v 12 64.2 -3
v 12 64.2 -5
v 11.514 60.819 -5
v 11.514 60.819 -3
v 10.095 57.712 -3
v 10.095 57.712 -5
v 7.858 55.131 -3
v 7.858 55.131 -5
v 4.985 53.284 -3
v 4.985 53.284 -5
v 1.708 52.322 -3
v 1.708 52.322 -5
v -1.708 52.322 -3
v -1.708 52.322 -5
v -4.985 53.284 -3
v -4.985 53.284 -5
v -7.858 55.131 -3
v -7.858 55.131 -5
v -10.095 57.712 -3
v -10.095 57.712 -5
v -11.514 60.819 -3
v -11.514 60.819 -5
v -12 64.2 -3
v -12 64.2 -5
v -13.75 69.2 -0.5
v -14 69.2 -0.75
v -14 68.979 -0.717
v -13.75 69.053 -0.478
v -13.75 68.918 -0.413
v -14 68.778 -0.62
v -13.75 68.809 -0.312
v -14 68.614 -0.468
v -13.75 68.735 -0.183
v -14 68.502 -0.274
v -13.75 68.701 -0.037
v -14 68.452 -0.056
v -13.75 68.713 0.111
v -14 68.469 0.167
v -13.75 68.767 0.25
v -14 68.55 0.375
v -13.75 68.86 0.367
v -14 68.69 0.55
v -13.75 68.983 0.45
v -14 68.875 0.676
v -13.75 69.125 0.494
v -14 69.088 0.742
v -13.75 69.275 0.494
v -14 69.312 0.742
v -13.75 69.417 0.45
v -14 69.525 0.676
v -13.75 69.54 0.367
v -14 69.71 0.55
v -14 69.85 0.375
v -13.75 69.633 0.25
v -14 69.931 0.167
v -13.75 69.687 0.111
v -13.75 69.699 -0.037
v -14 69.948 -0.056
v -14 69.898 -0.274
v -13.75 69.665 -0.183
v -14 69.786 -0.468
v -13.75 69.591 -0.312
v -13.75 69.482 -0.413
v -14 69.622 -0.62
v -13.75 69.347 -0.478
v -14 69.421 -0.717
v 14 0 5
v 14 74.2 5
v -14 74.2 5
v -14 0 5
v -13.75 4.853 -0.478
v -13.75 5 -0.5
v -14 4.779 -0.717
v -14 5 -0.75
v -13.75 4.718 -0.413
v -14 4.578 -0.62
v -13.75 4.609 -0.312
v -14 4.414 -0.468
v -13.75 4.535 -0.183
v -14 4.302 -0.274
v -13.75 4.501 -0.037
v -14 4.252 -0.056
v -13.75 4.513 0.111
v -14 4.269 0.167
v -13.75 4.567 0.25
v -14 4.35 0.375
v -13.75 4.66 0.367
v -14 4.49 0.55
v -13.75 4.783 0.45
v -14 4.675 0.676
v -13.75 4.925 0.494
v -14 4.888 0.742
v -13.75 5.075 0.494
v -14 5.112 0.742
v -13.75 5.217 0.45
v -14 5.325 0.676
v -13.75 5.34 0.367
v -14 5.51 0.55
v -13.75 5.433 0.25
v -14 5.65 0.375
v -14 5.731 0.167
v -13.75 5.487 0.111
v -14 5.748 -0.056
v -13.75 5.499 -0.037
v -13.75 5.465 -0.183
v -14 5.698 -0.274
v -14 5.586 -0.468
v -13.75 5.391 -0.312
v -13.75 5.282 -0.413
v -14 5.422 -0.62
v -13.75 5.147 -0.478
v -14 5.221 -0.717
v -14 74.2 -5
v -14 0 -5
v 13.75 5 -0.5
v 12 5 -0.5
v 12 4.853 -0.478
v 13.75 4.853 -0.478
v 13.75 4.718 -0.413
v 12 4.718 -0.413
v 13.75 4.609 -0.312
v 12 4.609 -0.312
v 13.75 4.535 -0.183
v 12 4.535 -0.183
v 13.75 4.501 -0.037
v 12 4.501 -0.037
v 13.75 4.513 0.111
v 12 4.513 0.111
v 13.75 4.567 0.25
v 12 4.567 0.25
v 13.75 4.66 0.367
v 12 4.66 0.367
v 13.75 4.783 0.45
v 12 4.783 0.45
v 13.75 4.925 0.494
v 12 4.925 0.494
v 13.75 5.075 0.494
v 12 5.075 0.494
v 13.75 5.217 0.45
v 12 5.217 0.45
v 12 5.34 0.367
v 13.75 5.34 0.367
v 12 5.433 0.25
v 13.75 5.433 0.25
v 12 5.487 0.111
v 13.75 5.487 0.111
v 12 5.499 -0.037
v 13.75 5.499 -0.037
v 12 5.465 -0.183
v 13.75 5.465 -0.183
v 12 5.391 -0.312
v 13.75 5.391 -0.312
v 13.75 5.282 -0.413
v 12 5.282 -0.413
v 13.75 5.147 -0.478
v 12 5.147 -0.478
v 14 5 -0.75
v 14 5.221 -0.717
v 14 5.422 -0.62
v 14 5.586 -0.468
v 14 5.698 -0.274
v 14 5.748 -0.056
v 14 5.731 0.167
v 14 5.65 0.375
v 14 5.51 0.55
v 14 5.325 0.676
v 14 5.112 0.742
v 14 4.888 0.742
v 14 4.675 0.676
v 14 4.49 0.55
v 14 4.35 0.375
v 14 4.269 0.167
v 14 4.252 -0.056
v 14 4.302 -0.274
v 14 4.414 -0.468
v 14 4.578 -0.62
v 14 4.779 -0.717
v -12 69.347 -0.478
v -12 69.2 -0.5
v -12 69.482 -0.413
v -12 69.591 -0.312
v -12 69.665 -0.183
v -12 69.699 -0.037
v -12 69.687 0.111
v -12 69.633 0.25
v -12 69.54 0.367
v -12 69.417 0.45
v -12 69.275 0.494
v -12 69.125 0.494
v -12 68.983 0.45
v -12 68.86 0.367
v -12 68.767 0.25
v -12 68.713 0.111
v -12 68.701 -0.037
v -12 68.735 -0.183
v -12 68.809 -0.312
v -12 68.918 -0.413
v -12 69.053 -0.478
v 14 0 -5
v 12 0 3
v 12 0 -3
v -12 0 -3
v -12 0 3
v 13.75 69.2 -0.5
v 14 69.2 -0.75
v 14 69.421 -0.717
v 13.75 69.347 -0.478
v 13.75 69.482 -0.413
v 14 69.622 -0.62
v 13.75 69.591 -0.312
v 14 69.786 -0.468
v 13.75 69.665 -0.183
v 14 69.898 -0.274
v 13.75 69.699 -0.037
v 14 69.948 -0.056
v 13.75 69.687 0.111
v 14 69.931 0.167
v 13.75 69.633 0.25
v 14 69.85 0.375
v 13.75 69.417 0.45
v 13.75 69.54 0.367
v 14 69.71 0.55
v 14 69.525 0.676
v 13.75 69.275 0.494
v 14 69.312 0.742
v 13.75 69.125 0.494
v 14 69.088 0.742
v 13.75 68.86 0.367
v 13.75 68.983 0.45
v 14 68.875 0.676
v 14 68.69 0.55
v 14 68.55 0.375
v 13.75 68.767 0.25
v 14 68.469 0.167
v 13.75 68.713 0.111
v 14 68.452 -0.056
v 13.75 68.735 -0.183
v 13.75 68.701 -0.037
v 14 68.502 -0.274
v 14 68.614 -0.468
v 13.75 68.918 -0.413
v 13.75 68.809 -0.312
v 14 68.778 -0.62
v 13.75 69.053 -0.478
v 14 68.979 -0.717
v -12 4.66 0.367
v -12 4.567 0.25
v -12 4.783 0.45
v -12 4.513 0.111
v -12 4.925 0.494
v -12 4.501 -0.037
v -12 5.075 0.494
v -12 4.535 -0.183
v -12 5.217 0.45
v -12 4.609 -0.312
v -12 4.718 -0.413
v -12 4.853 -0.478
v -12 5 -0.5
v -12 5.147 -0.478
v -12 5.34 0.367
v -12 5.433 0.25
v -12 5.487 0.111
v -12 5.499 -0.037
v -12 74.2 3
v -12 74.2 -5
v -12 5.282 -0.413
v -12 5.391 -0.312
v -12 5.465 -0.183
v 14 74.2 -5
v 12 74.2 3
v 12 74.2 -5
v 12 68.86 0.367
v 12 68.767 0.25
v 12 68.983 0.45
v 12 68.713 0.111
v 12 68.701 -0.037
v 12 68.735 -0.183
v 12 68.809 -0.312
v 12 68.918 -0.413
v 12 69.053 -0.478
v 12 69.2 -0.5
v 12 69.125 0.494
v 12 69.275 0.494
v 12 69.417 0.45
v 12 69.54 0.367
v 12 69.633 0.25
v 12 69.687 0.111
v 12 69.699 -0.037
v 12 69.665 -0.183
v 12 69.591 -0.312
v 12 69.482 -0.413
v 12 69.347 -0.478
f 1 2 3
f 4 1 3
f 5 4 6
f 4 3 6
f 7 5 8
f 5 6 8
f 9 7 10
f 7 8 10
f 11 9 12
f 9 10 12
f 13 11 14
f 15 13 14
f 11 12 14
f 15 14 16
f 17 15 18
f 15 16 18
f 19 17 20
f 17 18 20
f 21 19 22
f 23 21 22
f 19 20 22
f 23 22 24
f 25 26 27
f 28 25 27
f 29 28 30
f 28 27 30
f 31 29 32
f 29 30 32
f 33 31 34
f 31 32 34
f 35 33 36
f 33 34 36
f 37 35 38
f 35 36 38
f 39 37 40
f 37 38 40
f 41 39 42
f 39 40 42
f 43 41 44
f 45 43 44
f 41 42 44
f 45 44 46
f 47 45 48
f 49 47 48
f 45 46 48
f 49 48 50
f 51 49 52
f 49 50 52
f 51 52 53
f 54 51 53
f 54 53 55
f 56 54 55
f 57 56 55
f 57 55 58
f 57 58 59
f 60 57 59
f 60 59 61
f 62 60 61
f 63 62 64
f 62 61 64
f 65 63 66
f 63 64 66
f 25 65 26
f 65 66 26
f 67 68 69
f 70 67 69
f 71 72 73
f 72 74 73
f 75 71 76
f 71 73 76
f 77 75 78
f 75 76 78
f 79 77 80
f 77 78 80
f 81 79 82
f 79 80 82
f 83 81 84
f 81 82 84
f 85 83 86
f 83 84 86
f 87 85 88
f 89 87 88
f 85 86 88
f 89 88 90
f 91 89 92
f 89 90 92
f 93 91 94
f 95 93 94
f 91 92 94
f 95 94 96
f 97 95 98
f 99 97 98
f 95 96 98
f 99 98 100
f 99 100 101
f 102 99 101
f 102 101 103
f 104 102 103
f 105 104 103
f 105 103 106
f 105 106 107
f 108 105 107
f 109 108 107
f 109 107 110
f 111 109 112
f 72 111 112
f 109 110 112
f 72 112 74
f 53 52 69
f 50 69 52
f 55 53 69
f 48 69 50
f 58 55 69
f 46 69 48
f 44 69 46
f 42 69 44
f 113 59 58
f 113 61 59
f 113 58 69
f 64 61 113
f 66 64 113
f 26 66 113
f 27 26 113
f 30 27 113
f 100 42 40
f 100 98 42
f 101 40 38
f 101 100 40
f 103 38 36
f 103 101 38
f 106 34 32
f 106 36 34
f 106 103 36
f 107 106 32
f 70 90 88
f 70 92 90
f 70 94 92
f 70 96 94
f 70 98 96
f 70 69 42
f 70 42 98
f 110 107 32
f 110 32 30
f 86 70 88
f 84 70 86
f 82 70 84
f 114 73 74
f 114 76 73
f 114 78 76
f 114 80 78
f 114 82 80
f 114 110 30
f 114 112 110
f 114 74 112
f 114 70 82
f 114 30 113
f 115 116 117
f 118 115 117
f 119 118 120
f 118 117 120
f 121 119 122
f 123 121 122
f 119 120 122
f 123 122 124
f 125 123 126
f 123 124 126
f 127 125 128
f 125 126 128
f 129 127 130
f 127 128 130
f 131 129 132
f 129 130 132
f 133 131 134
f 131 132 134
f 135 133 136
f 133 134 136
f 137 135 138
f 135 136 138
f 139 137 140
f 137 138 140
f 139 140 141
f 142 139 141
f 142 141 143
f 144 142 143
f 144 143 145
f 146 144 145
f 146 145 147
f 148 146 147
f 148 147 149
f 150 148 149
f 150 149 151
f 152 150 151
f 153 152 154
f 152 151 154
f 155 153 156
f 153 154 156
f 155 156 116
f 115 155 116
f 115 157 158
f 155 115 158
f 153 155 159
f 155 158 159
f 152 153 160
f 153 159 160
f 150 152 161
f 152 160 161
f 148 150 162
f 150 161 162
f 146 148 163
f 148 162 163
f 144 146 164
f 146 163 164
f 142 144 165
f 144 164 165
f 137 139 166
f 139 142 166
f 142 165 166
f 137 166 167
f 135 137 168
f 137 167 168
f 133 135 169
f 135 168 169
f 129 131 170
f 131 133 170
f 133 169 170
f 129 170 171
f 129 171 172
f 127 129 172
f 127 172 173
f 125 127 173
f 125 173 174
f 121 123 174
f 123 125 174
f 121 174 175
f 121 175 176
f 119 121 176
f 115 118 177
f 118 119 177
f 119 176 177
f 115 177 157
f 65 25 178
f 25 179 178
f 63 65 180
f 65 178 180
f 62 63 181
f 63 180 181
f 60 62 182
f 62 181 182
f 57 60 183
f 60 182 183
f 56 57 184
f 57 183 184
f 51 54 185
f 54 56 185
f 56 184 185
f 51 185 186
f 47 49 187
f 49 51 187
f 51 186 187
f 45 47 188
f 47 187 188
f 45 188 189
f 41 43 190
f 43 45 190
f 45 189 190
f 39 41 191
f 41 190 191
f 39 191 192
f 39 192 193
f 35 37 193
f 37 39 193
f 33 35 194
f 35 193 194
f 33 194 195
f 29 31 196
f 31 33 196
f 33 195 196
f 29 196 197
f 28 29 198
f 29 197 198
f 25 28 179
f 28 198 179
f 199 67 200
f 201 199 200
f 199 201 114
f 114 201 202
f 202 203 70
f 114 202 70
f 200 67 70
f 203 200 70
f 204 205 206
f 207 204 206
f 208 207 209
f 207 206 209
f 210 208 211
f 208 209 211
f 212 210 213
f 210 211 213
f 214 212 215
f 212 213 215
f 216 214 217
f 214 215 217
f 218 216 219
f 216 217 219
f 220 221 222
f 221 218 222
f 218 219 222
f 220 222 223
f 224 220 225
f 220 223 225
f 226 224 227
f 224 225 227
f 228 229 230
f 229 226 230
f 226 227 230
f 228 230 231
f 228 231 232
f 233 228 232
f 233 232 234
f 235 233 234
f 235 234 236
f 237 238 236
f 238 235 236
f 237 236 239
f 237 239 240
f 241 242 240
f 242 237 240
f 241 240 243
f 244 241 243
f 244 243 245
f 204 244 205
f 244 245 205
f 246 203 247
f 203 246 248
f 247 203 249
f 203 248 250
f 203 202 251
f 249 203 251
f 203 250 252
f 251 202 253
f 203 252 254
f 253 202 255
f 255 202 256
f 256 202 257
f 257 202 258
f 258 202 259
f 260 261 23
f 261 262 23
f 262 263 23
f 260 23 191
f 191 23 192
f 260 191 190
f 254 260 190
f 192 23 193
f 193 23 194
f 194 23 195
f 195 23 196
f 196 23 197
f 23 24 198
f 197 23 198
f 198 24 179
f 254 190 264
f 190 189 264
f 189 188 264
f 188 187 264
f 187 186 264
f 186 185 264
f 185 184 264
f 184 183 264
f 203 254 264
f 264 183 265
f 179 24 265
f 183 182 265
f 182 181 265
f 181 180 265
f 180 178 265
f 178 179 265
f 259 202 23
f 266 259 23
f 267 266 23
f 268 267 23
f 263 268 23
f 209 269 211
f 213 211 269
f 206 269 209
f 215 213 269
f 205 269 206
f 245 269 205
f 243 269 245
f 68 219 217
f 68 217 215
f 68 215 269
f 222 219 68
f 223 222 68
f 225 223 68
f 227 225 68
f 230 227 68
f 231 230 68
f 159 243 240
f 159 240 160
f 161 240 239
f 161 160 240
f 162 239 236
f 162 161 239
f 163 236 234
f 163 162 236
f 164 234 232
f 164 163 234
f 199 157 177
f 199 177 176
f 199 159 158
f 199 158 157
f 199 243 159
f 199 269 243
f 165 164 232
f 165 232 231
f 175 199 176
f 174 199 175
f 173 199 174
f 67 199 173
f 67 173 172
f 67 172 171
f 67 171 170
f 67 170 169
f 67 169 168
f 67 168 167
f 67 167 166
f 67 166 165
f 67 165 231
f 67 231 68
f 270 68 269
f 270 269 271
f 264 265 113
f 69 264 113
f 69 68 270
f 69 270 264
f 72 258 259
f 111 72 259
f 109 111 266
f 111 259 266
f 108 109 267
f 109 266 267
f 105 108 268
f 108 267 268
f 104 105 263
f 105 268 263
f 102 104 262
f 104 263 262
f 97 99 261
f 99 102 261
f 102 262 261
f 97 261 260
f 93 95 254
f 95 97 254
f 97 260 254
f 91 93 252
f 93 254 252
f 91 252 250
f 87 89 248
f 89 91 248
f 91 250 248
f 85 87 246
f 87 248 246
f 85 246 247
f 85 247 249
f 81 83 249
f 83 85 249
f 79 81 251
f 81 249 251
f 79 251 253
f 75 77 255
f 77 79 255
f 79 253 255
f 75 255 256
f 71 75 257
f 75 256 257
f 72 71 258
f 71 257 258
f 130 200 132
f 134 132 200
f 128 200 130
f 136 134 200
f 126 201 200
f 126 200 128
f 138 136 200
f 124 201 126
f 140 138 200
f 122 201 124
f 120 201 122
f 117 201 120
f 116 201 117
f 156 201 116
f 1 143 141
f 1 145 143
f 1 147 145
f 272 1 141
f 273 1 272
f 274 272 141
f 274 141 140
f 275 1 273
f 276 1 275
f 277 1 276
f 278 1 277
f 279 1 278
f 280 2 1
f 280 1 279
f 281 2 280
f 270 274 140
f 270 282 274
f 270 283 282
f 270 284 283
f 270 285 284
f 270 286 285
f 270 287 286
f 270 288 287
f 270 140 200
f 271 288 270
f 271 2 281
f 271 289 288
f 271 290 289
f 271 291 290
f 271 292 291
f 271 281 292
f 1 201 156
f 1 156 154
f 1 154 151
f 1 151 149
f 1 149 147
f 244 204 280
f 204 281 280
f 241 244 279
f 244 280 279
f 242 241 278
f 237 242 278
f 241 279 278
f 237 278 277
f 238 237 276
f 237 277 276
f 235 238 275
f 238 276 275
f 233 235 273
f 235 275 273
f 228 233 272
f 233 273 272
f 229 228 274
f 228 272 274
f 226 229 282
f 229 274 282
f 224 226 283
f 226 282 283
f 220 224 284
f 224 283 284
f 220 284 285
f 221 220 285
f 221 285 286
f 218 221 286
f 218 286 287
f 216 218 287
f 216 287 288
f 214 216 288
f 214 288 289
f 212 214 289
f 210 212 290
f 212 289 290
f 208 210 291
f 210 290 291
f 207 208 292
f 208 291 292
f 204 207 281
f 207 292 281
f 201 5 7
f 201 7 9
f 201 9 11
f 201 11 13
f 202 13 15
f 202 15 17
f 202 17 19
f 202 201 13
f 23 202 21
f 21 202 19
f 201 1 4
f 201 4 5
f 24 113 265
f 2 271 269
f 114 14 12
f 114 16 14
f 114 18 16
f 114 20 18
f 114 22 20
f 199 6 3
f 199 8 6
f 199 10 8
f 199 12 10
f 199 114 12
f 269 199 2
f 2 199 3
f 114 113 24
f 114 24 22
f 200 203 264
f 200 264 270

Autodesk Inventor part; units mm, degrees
ref_plane "YZ Plane" through (0, 0, 0) normal (1, 0, 0) x (0, 1, 0)
ref_plane "XZ Plane" through (0, 0, 0) normal (0, 1, 0) x (-1, 0, 0)
ref_plane "XY Plane" through (0, 0, 0) normal (0, 0, 1) x (1, 0, 0)
sketch "Эскиз1" plane through (0, 0, 0) normal (0, 1, 0) x (-1, 0, 0)
  line L0 (14, -5) -> (-14, -5)
  line L1 (-14, -5) -> (-14, 5)
  line L2 (-14, 5) -> (14, 5)
  line L3 (14, 5) -> (14, -5)
  line L4 (-14, -5) -> (14, 5) construction
  line L5 (14, -5) -> (-14, 5) construction
  line L6 (-12, -3) -> (12, -3)
  line L7 (12, -3) -> (12, 3)
  line L8 (12, 3) -> (-12, 3)
  line L9 (-12, 3) -> (-12, -3)
  point P0 (0, 0)
  point P1 (0, 0)
  dimension "d0" = 28
  dimension "d1" = 10
  dimension "d2" = 2
extrude "Выдавливание1" add sketch "Эскиз1" along normal blind 74.2
sketch "Эскиз3" plane through (14, 0, -5) normal (0, 0, -1) x (-1, 0, 0)
  line L0 (0, 0) -> (0, 74.2) projected
  line L1 (28, 0) -> (28, 74.2) projected
  line L2 (28, 0) -> (28, 74.2) projected
  line L3 (0, 0) -> (0, 74.2) projected
  line L4 (0, 74.2) -> (28, 74.2) projected
  arc A0 (2, 64.2) -> (26, 64.2) centre (14, 64.2) ccw
  line L5 (26, 0) -> (26, 74.2) projected
  line L6 (2, 0) -> (2, 74.2) projected
  line L7 (26, 0) -> (26, 74.2) projected
  line L8 (26, 64.2) -> (26, 74.2)
  line L9 (26, 74.2) -> (2, 74.2)
  line L10 (2, 64.2) -> (2, 74.2)
  point P0 (14, 0)
  dimension "d10" = 10
extrude "Выдавливание3" cut sketch "Эскиз3" against normal up to surface (2 mm away)
sketch "Эскиз2" plane through (14, 0, 5) normal (1, 0, 0) x (0, 0, -1)
  line L0 (0, 74.2) -> (10, 74.2) construction
  line L1 (10, 74.2) -> (0, 64.2) construction
  line L2 (0, 0) -> (0, 74.2) construction
  line L3 (0, 74.2) -> (10, 64.2) construction
  line L4 (10, 0) -> (10, 74.2) construction
  line L5 (10, 0) -> (0, 10) construction
  line L6 (0, 0) -> (10, 10) construction
  circle A0 centre (5, 69.2) radius 0.5
  circle A1 centre (5, 5) radius 0.5
  point P0 (5, 0)
  dimension "d5" = 1
  dimension "d6" = 1
hole "Отверстие1" at (14, 69.2, 0) at (14, 5, 0) direction (-1, 0, 0) diameter 1 depth 2 countersink diameter 1.5 countersink angle 90
mirror "Зеркальное отражение1" about plane through (0, 0, 0) normal (1, 0, 0) of "Отверстие1"
properties part number "board-1-new"
